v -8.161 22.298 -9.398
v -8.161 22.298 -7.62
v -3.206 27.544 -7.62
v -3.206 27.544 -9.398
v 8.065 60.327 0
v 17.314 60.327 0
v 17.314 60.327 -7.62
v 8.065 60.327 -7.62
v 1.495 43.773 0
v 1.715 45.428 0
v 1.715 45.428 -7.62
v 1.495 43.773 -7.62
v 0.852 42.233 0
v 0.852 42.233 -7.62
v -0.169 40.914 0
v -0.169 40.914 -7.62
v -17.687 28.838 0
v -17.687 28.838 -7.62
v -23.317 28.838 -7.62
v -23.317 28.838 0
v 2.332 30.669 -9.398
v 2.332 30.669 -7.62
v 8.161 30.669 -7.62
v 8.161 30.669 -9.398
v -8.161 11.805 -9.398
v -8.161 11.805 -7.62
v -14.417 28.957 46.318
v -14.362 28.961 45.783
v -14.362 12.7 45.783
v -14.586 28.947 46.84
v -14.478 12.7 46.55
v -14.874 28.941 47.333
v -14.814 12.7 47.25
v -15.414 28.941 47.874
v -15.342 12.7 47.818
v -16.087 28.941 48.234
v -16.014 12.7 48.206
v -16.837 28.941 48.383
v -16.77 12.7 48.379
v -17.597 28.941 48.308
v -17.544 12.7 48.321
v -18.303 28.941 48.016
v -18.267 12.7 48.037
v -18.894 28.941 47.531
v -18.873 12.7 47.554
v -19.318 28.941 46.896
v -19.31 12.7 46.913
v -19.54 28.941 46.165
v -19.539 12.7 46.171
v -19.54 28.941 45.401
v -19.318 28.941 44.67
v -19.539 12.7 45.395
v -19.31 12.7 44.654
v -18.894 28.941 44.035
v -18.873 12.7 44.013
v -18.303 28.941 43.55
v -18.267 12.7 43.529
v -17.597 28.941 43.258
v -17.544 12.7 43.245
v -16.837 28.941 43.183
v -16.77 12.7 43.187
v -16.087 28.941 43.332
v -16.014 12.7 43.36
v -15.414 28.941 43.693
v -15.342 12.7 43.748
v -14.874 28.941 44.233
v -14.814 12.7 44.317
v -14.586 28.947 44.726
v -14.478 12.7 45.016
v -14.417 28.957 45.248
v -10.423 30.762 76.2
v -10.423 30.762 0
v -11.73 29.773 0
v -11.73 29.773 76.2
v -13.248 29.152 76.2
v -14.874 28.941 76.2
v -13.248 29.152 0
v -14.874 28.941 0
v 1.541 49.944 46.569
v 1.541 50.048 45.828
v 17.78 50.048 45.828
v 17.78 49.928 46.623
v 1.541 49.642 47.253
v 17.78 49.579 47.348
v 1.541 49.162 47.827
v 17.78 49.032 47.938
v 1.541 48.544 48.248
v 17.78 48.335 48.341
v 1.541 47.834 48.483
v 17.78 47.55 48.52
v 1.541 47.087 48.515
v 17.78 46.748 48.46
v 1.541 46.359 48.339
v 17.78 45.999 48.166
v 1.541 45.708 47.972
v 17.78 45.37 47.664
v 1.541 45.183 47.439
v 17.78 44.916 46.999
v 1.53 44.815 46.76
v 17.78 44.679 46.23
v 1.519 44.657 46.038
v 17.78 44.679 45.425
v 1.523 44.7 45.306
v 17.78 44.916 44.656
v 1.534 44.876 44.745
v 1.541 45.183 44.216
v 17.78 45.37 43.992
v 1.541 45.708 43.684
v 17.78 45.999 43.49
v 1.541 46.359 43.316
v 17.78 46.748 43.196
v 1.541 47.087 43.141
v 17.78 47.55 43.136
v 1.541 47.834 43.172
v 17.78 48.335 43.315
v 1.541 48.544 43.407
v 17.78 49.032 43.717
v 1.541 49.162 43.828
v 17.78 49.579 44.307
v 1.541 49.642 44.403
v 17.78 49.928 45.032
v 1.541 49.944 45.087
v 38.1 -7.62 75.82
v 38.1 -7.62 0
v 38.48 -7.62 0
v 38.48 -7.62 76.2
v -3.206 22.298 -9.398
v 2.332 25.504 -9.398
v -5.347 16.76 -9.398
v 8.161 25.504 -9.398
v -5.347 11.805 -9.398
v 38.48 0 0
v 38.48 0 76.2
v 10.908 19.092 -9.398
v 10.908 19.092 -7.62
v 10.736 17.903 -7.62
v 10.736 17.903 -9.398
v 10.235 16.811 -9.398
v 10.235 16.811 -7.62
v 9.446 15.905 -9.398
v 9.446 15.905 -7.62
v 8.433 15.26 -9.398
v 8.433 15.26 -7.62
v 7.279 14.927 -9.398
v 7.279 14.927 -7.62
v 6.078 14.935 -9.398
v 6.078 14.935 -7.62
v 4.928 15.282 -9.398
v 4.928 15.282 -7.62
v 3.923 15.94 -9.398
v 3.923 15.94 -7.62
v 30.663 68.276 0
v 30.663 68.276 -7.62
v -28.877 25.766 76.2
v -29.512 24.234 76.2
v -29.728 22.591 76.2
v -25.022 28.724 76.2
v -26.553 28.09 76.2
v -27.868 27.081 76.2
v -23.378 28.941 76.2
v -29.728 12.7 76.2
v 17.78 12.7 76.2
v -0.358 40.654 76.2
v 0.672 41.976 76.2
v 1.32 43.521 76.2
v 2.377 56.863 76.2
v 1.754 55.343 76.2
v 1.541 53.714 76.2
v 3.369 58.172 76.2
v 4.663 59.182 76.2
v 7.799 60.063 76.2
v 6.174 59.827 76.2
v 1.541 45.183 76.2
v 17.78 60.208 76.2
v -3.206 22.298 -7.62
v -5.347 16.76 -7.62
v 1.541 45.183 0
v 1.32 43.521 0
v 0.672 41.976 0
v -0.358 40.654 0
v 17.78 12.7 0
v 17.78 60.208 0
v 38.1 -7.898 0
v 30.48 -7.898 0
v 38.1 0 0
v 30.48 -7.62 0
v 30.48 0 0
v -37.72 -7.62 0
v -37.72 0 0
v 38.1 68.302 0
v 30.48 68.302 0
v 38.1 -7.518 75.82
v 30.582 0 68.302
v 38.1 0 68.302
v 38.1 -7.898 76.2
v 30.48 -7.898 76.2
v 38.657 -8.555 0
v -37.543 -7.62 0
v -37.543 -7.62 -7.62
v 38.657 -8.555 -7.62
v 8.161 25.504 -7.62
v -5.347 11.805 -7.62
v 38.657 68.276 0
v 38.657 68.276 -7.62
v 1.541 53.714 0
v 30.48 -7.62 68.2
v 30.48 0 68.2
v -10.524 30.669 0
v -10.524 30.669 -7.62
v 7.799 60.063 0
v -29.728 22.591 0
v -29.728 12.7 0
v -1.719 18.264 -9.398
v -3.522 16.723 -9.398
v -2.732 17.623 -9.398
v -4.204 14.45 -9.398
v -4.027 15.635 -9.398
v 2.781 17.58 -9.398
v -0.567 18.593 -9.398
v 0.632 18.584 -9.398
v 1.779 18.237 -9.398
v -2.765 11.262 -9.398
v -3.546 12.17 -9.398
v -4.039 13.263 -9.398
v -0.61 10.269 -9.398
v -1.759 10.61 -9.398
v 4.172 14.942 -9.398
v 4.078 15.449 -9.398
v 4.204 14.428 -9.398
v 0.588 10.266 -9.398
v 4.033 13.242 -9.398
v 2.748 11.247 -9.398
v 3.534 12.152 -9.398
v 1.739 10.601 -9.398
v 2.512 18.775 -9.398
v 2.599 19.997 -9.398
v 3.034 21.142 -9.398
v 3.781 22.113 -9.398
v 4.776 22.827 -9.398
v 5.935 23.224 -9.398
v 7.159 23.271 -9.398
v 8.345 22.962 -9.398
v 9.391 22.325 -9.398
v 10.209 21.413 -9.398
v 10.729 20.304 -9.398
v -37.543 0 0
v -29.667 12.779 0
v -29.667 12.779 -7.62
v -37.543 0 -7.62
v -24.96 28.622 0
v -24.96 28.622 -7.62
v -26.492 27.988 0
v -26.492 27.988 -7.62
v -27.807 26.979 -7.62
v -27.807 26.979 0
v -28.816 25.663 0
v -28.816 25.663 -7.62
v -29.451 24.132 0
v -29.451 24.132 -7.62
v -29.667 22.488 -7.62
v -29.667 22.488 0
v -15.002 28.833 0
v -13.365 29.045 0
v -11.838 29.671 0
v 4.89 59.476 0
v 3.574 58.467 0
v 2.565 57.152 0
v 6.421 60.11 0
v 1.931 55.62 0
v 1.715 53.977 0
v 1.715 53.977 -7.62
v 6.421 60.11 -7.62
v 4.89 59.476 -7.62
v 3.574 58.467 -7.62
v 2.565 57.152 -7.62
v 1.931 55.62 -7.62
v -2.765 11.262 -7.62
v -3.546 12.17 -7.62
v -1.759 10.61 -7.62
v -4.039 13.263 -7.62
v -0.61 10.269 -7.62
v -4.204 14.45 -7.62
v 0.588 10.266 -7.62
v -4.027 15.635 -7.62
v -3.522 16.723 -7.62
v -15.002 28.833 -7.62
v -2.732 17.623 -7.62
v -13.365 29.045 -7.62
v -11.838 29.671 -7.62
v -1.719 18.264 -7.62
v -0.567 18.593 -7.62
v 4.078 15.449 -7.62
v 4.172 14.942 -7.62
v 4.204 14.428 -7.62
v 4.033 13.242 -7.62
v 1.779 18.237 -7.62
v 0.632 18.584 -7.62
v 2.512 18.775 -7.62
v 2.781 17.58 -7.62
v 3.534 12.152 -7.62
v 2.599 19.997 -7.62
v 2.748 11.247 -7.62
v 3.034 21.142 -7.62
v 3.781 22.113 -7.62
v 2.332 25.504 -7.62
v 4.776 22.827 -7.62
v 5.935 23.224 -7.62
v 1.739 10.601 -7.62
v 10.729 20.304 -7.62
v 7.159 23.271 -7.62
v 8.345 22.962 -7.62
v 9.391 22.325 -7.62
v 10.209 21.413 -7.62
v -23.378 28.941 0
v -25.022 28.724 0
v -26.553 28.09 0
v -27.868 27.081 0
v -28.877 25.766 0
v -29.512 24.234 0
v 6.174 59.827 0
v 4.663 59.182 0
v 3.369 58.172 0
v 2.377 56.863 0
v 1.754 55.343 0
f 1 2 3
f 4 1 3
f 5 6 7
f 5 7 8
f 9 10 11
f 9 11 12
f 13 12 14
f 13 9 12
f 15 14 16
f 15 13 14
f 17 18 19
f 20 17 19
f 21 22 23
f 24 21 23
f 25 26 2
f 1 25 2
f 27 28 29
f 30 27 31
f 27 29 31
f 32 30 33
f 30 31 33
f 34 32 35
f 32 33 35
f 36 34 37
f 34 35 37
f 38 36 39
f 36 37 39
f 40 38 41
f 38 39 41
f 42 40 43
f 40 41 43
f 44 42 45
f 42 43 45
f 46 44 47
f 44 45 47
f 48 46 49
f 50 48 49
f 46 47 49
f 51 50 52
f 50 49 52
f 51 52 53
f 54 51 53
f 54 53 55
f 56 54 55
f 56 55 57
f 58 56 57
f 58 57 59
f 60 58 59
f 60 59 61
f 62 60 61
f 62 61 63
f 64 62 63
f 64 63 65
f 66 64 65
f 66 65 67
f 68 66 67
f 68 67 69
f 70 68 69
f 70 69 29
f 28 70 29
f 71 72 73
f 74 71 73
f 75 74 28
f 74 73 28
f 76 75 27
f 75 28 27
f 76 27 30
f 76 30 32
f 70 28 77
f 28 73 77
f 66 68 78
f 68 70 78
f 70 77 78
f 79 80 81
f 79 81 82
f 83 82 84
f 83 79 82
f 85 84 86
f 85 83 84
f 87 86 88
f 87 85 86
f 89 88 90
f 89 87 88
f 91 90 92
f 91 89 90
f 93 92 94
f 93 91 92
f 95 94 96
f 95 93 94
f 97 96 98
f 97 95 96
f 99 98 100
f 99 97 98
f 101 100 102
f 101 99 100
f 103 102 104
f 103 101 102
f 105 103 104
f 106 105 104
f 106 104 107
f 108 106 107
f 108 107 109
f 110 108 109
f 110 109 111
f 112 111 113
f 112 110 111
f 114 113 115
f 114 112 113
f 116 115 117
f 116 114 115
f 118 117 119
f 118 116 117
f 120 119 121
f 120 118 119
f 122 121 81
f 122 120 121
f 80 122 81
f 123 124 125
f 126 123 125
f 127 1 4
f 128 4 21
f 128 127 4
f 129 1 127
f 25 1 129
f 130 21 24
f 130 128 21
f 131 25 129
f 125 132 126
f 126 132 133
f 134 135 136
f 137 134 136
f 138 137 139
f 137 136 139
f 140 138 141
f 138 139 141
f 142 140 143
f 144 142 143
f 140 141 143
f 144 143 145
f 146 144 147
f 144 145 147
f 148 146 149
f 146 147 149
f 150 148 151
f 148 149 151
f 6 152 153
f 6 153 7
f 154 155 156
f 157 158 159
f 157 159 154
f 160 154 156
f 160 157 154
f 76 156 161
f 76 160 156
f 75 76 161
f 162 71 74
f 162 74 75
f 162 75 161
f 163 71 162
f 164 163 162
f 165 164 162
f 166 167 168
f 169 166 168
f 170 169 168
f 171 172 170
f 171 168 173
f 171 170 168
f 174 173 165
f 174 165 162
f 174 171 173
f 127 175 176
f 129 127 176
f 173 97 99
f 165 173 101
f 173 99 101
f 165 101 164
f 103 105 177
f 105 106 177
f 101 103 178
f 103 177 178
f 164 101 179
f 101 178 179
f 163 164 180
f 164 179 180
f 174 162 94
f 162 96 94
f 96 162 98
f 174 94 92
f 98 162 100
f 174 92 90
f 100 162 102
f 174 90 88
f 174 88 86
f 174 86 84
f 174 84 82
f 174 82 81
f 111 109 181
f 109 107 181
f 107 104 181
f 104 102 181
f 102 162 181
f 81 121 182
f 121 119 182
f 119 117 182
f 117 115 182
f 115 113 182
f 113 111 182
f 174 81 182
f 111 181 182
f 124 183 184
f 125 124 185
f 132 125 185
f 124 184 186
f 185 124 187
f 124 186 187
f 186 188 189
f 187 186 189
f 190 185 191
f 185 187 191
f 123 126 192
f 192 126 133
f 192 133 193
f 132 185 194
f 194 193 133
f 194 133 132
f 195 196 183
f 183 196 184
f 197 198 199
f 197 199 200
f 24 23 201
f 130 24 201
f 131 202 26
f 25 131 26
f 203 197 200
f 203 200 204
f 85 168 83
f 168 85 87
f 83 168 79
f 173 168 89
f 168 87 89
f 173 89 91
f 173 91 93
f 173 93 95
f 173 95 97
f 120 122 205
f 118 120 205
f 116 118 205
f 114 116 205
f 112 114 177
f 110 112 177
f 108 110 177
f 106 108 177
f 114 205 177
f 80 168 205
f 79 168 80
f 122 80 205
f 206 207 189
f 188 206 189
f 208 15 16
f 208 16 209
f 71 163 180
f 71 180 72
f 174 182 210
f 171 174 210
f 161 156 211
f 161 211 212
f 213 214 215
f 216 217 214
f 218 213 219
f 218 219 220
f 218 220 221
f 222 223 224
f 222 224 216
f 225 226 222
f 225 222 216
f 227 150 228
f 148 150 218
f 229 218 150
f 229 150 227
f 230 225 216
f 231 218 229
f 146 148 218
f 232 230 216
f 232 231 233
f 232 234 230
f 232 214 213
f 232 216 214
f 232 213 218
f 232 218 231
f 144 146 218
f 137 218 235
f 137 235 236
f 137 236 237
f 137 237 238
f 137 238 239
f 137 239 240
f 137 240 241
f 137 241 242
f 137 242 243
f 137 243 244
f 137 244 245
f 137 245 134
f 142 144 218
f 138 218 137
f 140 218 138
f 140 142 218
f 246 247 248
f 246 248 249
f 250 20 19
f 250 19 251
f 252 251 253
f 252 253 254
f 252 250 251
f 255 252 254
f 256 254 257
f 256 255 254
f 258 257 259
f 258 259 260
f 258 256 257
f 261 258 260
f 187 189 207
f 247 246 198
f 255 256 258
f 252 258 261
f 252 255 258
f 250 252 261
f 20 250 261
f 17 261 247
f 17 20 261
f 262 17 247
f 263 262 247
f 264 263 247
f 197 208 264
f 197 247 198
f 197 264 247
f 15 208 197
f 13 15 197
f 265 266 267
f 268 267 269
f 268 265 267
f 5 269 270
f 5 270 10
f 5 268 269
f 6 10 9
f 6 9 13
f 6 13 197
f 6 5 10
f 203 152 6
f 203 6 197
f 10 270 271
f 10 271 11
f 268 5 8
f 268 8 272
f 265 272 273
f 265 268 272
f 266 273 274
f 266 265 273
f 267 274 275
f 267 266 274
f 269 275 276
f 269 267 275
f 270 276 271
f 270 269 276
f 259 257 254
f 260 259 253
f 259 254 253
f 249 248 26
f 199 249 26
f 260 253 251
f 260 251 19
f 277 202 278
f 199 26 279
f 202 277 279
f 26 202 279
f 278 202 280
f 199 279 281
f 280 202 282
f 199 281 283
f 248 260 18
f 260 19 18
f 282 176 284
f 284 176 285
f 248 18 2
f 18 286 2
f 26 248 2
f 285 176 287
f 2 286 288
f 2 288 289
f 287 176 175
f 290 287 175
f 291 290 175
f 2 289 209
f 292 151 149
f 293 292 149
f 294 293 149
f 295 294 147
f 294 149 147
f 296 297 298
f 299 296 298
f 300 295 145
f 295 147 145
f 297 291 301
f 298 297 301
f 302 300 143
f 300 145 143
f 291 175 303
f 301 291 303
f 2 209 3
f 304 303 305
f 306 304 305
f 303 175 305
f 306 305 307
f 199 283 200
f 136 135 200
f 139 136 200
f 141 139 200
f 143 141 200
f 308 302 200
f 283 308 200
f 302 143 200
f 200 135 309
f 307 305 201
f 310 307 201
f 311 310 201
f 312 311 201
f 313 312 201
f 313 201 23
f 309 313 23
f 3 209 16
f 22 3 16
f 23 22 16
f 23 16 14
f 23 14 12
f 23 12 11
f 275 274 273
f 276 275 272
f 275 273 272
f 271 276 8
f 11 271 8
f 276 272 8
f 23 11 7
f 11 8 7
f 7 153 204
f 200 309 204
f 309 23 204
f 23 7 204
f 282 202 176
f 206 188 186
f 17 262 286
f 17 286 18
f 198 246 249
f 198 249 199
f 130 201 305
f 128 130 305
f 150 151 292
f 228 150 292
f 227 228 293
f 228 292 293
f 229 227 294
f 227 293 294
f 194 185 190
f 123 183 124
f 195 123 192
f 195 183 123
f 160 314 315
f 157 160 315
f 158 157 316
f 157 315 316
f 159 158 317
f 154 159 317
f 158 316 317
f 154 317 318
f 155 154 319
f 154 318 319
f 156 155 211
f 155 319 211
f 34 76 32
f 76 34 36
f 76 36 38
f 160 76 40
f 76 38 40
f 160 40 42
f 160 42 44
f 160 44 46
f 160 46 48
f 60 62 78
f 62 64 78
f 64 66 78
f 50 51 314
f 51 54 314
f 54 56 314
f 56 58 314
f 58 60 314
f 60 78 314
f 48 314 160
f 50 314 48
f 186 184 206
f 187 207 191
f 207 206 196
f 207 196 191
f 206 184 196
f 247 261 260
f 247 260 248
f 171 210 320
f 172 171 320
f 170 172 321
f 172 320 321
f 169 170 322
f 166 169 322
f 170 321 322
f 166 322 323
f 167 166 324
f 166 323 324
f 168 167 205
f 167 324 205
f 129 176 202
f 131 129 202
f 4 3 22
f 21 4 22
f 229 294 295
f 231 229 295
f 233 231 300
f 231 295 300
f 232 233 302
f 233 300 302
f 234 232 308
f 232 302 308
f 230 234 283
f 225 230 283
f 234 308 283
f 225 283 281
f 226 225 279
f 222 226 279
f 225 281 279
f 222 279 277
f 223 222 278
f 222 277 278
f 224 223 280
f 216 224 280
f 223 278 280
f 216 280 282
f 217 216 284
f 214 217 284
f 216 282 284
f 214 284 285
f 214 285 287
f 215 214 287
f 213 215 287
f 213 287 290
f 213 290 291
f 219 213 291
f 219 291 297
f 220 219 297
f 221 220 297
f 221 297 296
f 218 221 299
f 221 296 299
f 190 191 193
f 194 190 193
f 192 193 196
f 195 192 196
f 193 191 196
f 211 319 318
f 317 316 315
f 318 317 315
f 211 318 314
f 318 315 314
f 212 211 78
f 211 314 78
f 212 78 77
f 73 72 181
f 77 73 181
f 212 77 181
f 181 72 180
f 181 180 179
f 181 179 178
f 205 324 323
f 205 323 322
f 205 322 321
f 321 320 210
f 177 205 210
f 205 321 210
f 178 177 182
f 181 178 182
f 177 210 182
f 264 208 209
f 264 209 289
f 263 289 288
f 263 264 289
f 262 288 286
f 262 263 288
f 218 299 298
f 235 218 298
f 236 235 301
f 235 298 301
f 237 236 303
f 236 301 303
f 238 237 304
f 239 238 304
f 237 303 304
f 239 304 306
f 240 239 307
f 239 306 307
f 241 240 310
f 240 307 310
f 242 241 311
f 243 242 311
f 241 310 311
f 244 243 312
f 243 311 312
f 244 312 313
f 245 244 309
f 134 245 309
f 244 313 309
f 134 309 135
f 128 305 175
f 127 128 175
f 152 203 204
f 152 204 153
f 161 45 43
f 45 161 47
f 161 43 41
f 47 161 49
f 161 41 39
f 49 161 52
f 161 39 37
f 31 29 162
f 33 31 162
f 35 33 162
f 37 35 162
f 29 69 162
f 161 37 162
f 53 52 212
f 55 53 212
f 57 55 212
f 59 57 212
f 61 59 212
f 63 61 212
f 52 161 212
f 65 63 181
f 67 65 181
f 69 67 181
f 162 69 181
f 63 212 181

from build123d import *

# Parameters (mm, degrees)
F1_DEPTH       = 7.62
F3_START       = 30.48
F3_DEPTH       = 7.62
F5_DEPTH       = 76.2
F7_DEPTH       = 7.62
F8_R           = 2.6031217073
F9_DEPTH       = 98.806
F10_R          = 2.6995181892
F11_DEPTH      = 47.752
F11_DEPTH_BACK = 45.212
F13_DEPTH      = 1.778


# Not quite as in the source:
# - a feature names something its author has since deleted; it is built from what else it names


with BuildPart() as f1:
    # F0 (on Front) → F1 (new body)
    with BuildSketch(Plane.XZ):
        Polygon((38.4802398158, 76.2), (-37.7197601842, 0), (38.4802398158, 0), align=None)
    extrude(amount=F1_DEPTH)

    # F2 (on Right) → F3 (join)
    with BuildSketch(Plane.YZ.offset(F3_START)):
        Polygon((68.3021095197, 0), (-7.8978904803, 76.2), (-7.8978904803, 0), align=None)
    extrude(amount=F3_DEPTH)


with BuildPart() as f5:
    # F4 (on Top) → F5 (new body)
    with BuildSketch(Plane.XY):
        with BuildLine():
            Line((17.78, 12.7), (17.78, 60.2081210786))
            Line((17.78, 60.2081210786), (7.7990821899, 60.0634692811))
            ThreePointArc((7.7990821899, 60.0634692811), (3.3685570616, 58.1716114676), (1.5411020302, 53.7141360603))
            Line((1.5411020302, 53.7141360603), (1.5411020302, 45.1826832225))
            ThreePointArc((1.5411020302, 45.1826832225), (1.047169173, 42.7272855726), (-0.3577885585, 40.6538726713))
            Line((-0.3577885585, 40.6538726713), (-10.4225503406, 30.7617927566))
            ThreePointArc((-10.4225503406, 30.7617927566), (-12.4690232929, 29.4135101913), (-14.8736597519, 28.9406033078))
            Line((-14.8736597519, 28.9406033078), (-23.3781210786, 28.9406033078))
            ThreePointArc((-23.3781210786, 28.9406033078), (-27.8682491391, 27.0807313683), (-29.7281210786, 22.5906033078))
            Line((-29.7281210786, 22.5906033078), (-29.7281210786, 12.7))
            Line((-29.7281210786, 12.7), (17.78, 12.7))
        make_face()
    extrude(amount=F5_DEPTH)

    # F8 (on Front) → F9 (cut)
    with BuildSketch(Plane.XZ):
        with Locations((-16.9649993712, 45.7831217073)):
            Circle(F8_R)
    extrude(amount=-F9_DEPTH, mode=Mode.SUBTRACT)

    # F10 (on Right) → F11 (cut, two sides)
    with BuildSketch(Plane.YZ) as f11_sk:
        with Locations((47.3486028893, 45.827724101)):
            Circle(F10_R)
    extrude(amount=F11_DEPTH, mode=Mode.SUBTRACT)
    extrude(f11_sk.sketch, amount=-F11_DEPTH_BACK, mode=Mode.SUBTRACT)


with BuildPart() as f7:
    # F6 (on Top) → F7 (new body)
    with BuildSketch(Plane.XY):
        with BuildLine():
            Line((-29.666883871, 22.4884131303), (-29.666883871, 12.7789853141))
            Line((-29.666883871, 12.7789853141), (-37.5426076353, 0))
            Line((-37.5426076353, 0), (-37.5426076353, -7.62))
            Line((-37.5426076353, -7.62), (38.6573923647, -8.5552895431))
            Line((38.6573923647, -8.5552895431), (38.6573923647, 67.6447104569))
            Line((38.6573923647, 67.6447104569), (38.6573923647, 68.276040256))
            Line((38.6573923647, 68.276040256), (30.6627471, 68.276040256))
            Line((30.6627471, 68.276040256), (17.3135716468, 60.3265352547))
            Line((17.3135716468, 60.3265352547), (8.0645363381, 60.3265352547))
            ThreePointArc((8.0645363381, 60.3265352547), (3.5744082776, 58.4666633153), (1.7145363381, 53.9765352547))
            Line((1.7145363381, 53.9765352547), (1.7145363381, 45.4277863735))
            ThreePointArc((1.7145363381, 45.4277863735), (1.2246529933, 42.9820691396), (-0.1694109967, 40.9137113197))
            Line((-0.1694109967, 40.9137113197), (-10.5239810344, 30.6692970018))
            ThreePointArc((-10.5239810344, 30.6692970018), (-12.5811917049, 29.3080014082), (-15.0019310535, 28.8333832011))
            Line((-15.0019310535, 28.8333832011), (-17.6865611632, 28.8384131303))
            Line((-17.6865611632, 28.8384131303), (-23.316883871, 28.8384131303))
            ThreePointArc((-23.316883871, 28.8384131303), (-27.8070119315, 26.9785411909), (-29.666883871, 22.4884131303))
        make_face()
    extrude(amount=-F7_DEPTH)

    # F12 (on face) → F13 (join)
    with BuildSketch(Plane(origin=(0, 0, -7.62), x_dir=(1, 0, 0), z_dir=(0, 0, -1))):
        Polygon((-5.3466960156, -11.8047548458), (-8.1613129005, -11.8047548458), (-8.1613129005, -22.2978685051), (-3.206232097, -27.5444276631), (2.3318054155, -30.6692970018), (8.1613119692, -30.6692970018), (8.1613119692, -25.5040973425), (2.3318054155, -25.5040973425), (-3.206232097, -22.2978685051), (-5.3466960156, -16.7598351836), align=None)
        with BuildLine():
            ThreePointArc((3.9225352044, -15.9396454022), (4.1328254672, -15.1968039625), (4.2037192827, -14.4280325621))
            ThreePointArc((4.2037192827, -14.4280325621), (-3.8316760126, -12.699011237), (2.7814003592, -17.5800268277))
            ThreePointArc((2.7814003592, -17.5800268277), (3.2530804789, -16.6910449513), (3.9225352044, -15.9396454022))
        make_face()
        with BuildLine():
            ThreePointArc((3.9225352044, -15.9396454022), (3.2530804789, -16.6910449513), (2.7814003592, -17.5800268277))
            ThreePointArc((2.7814003592, -17.5800268277), (3.4508550847, -16.8286272786), (3.9225352044, -15.9396454022))
        make_face()
        with BuildLine():
            ThreePointArc((3.9225352044, -15.9396454022), (3.4508550847, -16.8286272786), (2.7814003592, -17.5800268277))
            ThreePointArc((2.7814003592, -17.5800268277), (5.9351641632, -23.2244651349), (10.9076548463, -19.0916396677))
            ThreePointArc((10.9076548463, -19.0916396677), (8.4329568887, -15.2599636552), (3.9225352044, -15.9396454022))
        make_face()
    extrude(amount=F13_DEPTH)


solid = Compound([f1.part, f5.part, f7.part])
